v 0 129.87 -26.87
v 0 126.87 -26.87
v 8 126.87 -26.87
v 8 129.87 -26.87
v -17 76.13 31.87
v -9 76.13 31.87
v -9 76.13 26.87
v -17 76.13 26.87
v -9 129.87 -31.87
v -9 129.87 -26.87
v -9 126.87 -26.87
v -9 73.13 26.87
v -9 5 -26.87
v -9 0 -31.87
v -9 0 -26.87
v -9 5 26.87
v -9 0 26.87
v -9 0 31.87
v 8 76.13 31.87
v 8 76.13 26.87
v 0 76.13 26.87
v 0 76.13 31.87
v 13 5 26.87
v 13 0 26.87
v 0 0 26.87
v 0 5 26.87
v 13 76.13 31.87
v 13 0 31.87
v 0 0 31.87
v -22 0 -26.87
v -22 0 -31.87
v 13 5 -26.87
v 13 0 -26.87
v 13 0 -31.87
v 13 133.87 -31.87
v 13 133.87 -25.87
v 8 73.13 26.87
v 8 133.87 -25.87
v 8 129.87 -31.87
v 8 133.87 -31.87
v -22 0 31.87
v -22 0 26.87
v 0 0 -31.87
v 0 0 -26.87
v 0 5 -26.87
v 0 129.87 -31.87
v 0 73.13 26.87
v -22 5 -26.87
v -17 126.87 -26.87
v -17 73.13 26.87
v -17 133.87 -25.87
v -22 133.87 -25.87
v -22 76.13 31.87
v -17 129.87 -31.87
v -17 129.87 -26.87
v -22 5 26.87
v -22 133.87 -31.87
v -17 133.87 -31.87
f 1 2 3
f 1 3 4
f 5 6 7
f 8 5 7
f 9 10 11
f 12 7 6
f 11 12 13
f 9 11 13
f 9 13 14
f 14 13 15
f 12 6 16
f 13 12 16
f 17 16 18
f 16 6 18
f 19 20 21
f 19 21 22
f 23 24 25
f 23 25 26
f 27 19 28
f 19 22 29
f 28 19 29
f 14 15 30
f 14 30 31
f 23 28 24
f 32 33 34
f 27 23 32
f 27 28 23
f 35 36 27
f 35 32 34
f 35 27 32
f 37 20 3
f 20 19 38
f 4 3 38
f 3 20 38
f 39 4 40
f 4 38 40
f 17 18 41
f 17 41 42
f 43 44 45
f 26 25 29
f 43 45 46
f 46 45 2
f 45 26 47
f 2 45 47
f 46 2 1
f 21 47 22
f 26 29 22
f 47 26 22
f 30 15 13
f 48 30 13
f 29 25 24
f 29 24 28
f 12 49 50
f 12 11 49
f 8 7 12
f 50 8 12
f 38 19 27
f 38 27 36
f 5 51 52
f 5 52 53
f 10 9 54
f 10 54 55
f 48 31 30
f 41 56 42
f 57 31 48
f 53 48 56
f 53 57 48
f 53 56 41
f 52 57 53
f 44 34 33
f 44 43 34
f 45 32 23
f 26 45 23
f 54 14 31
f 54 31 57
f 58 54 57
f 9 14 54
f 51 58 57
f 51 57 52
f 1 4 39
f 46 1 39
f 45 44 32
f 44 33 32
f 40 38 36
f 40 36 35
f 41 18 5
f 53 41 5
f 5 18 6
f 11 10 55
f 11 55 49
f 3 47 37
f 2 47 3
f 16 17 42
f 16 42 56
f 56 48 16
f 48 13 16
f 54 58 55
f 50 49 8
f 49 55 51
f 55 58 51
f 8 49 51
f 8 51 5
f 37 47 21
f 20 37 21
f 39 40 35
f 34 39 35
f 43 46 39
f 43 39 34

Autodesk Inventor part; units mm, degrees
ref_plane "YZ Plane" through (0, 0, 0) normal (1, 0, 0) x (0, 1, 0)
ref_plane "XZ Plane" through (0, 0, 0) normal (0, 1, 0) x (-1, 0, 0)
sketch "Boceto1" plane through (0, 0, 0) normal (1, 0, 0) x (0, 1, 0)
  line L0 (0, 0) -> (100, 0) construction
  line L1 (0, 0) -> (0, -26.87) construction
  line L2 (0, 0) -> (0, 26.87) construction
  line L3 (100, 0) -> (126.8701, -26.8701) construction
  line L4 (100, 0) -> (138, 0) construction
  line L5 (100, 0) -> (73.1299, 26.8701) construction
  line L6 (100, 0) -> (138, 0) construction
  line L7 (73.1299, 26.8701) -> (126.8701, -26.8701)
  line L8 (0, 26.87) -> (0, -26.87)
  line L9 (73.13, 26.87) -> (76.13, 26.87)
  line L10 (76.13, 26.87) -> (76.13, 31.87)
  line L11 (76.13, 31.87) -> (0, 31.87)
  line L12 (0, 31.87) -> (0, 26.87)
  line L13 (126.87, -26.87) -> (129.87, -26.87)
  line L14 (129.87, -26.87) -> (129.87, -31.87)
  line L15 (129.87, -31.87) -> (0, -31.87)
  line L16 (0, -31.87) -> (0, -26.87)
extrude "Extrusión1" add sketch "Boceto1" along normal blind 8
sketch "Boceto2" plane through (8, 0, 0) normal (1, 0, 0) x (0, 0, -1)
  line L0 (-26.87, 76.13) -> (-31.87, 76.13) construction
  line L1 (-31.87, 76.13) -> (-26.87, 76.13)
  line L2 (26.87, 126.87) -> (26.87, 129.87)
  line L3 (31.87, 129.87) -> (26.87, 129.87) projected
  line L4 (26.87, 129.87) -> (31.87, 129.87)
  line L5 (-31.87, 76.13) -> (-26.87, 76.13) construction
  line L6 (25.87, 133.87) -> (31.87, 133.87) construction
  line L7 (31.87, 133.87) -> (31.87, 129.87) construction
  line L8 (-31.87, 76.13) -> (25.87, 133.87)
  line L9 (31.87, 133.87) -> (31.87, 129.87)
  line L10 (25.87, 133.87) -> (31.87, 133.87)
  line L11 (-26.87, 73.13) -> (-26.87, 76.13) projected
  line L12 (-26.87, 76.13) -> (-31.87, 76.13)
  line L13 (-31.87, 76.13) -> (-31.87, 0) projected
  line L14 (-31.87, 76.13) -> (-31.87, 0)
  line L15 (-31.87, 0) -> (31.87, 0) projected
  line L16 (-31.87, 0) -> (31.87, 0)
  line L17 (31.87, 0) -> (31.87, 133.87)
  point P0 (0, 0)
  dimension "d18" = 133.87
extrude "Extrusión2" add sketch "Boceto2" along normal blind 5
ref_plane "Plano de trabajo1" through (-4.5, 0, 0) normal (-1, 0, 0) x (0, 0, 1)
mirror "Simetría1" about plane through (-4.5, 0, 0) normal (-1, 0, 0) of "Extrusión1", "Extrusión2"
sketch "Boceto4" plane through (13, 0, 0) normal (1, 0, 0) x (0, 0, -1)
  line L0 (-31.87, 76.13) -> (-31.87, 0) projected
  line L1 (-31.87, 0) -> (-26.87, 0)
  line L2 (-31.87, 0) -> (31.87, 0) projected
  line L3 (-26.87, 0) -> (-26.87, 5)
  line L4 (31.87, 0) -> (26.87, 0)
  line L5 (26.87, 0) -> (26.87, 5)
  line L6 (26.87, 5) -> (-26.87, 5)
  point P0 (0, 0)
  dimension "d23" = 5
  dimension "d24" = 5
  dimension "d25" = 5
extrude "Extrusión3" cut sketch "Boceto4" against normal through all
properties part number "BeamSplitter_Base"
